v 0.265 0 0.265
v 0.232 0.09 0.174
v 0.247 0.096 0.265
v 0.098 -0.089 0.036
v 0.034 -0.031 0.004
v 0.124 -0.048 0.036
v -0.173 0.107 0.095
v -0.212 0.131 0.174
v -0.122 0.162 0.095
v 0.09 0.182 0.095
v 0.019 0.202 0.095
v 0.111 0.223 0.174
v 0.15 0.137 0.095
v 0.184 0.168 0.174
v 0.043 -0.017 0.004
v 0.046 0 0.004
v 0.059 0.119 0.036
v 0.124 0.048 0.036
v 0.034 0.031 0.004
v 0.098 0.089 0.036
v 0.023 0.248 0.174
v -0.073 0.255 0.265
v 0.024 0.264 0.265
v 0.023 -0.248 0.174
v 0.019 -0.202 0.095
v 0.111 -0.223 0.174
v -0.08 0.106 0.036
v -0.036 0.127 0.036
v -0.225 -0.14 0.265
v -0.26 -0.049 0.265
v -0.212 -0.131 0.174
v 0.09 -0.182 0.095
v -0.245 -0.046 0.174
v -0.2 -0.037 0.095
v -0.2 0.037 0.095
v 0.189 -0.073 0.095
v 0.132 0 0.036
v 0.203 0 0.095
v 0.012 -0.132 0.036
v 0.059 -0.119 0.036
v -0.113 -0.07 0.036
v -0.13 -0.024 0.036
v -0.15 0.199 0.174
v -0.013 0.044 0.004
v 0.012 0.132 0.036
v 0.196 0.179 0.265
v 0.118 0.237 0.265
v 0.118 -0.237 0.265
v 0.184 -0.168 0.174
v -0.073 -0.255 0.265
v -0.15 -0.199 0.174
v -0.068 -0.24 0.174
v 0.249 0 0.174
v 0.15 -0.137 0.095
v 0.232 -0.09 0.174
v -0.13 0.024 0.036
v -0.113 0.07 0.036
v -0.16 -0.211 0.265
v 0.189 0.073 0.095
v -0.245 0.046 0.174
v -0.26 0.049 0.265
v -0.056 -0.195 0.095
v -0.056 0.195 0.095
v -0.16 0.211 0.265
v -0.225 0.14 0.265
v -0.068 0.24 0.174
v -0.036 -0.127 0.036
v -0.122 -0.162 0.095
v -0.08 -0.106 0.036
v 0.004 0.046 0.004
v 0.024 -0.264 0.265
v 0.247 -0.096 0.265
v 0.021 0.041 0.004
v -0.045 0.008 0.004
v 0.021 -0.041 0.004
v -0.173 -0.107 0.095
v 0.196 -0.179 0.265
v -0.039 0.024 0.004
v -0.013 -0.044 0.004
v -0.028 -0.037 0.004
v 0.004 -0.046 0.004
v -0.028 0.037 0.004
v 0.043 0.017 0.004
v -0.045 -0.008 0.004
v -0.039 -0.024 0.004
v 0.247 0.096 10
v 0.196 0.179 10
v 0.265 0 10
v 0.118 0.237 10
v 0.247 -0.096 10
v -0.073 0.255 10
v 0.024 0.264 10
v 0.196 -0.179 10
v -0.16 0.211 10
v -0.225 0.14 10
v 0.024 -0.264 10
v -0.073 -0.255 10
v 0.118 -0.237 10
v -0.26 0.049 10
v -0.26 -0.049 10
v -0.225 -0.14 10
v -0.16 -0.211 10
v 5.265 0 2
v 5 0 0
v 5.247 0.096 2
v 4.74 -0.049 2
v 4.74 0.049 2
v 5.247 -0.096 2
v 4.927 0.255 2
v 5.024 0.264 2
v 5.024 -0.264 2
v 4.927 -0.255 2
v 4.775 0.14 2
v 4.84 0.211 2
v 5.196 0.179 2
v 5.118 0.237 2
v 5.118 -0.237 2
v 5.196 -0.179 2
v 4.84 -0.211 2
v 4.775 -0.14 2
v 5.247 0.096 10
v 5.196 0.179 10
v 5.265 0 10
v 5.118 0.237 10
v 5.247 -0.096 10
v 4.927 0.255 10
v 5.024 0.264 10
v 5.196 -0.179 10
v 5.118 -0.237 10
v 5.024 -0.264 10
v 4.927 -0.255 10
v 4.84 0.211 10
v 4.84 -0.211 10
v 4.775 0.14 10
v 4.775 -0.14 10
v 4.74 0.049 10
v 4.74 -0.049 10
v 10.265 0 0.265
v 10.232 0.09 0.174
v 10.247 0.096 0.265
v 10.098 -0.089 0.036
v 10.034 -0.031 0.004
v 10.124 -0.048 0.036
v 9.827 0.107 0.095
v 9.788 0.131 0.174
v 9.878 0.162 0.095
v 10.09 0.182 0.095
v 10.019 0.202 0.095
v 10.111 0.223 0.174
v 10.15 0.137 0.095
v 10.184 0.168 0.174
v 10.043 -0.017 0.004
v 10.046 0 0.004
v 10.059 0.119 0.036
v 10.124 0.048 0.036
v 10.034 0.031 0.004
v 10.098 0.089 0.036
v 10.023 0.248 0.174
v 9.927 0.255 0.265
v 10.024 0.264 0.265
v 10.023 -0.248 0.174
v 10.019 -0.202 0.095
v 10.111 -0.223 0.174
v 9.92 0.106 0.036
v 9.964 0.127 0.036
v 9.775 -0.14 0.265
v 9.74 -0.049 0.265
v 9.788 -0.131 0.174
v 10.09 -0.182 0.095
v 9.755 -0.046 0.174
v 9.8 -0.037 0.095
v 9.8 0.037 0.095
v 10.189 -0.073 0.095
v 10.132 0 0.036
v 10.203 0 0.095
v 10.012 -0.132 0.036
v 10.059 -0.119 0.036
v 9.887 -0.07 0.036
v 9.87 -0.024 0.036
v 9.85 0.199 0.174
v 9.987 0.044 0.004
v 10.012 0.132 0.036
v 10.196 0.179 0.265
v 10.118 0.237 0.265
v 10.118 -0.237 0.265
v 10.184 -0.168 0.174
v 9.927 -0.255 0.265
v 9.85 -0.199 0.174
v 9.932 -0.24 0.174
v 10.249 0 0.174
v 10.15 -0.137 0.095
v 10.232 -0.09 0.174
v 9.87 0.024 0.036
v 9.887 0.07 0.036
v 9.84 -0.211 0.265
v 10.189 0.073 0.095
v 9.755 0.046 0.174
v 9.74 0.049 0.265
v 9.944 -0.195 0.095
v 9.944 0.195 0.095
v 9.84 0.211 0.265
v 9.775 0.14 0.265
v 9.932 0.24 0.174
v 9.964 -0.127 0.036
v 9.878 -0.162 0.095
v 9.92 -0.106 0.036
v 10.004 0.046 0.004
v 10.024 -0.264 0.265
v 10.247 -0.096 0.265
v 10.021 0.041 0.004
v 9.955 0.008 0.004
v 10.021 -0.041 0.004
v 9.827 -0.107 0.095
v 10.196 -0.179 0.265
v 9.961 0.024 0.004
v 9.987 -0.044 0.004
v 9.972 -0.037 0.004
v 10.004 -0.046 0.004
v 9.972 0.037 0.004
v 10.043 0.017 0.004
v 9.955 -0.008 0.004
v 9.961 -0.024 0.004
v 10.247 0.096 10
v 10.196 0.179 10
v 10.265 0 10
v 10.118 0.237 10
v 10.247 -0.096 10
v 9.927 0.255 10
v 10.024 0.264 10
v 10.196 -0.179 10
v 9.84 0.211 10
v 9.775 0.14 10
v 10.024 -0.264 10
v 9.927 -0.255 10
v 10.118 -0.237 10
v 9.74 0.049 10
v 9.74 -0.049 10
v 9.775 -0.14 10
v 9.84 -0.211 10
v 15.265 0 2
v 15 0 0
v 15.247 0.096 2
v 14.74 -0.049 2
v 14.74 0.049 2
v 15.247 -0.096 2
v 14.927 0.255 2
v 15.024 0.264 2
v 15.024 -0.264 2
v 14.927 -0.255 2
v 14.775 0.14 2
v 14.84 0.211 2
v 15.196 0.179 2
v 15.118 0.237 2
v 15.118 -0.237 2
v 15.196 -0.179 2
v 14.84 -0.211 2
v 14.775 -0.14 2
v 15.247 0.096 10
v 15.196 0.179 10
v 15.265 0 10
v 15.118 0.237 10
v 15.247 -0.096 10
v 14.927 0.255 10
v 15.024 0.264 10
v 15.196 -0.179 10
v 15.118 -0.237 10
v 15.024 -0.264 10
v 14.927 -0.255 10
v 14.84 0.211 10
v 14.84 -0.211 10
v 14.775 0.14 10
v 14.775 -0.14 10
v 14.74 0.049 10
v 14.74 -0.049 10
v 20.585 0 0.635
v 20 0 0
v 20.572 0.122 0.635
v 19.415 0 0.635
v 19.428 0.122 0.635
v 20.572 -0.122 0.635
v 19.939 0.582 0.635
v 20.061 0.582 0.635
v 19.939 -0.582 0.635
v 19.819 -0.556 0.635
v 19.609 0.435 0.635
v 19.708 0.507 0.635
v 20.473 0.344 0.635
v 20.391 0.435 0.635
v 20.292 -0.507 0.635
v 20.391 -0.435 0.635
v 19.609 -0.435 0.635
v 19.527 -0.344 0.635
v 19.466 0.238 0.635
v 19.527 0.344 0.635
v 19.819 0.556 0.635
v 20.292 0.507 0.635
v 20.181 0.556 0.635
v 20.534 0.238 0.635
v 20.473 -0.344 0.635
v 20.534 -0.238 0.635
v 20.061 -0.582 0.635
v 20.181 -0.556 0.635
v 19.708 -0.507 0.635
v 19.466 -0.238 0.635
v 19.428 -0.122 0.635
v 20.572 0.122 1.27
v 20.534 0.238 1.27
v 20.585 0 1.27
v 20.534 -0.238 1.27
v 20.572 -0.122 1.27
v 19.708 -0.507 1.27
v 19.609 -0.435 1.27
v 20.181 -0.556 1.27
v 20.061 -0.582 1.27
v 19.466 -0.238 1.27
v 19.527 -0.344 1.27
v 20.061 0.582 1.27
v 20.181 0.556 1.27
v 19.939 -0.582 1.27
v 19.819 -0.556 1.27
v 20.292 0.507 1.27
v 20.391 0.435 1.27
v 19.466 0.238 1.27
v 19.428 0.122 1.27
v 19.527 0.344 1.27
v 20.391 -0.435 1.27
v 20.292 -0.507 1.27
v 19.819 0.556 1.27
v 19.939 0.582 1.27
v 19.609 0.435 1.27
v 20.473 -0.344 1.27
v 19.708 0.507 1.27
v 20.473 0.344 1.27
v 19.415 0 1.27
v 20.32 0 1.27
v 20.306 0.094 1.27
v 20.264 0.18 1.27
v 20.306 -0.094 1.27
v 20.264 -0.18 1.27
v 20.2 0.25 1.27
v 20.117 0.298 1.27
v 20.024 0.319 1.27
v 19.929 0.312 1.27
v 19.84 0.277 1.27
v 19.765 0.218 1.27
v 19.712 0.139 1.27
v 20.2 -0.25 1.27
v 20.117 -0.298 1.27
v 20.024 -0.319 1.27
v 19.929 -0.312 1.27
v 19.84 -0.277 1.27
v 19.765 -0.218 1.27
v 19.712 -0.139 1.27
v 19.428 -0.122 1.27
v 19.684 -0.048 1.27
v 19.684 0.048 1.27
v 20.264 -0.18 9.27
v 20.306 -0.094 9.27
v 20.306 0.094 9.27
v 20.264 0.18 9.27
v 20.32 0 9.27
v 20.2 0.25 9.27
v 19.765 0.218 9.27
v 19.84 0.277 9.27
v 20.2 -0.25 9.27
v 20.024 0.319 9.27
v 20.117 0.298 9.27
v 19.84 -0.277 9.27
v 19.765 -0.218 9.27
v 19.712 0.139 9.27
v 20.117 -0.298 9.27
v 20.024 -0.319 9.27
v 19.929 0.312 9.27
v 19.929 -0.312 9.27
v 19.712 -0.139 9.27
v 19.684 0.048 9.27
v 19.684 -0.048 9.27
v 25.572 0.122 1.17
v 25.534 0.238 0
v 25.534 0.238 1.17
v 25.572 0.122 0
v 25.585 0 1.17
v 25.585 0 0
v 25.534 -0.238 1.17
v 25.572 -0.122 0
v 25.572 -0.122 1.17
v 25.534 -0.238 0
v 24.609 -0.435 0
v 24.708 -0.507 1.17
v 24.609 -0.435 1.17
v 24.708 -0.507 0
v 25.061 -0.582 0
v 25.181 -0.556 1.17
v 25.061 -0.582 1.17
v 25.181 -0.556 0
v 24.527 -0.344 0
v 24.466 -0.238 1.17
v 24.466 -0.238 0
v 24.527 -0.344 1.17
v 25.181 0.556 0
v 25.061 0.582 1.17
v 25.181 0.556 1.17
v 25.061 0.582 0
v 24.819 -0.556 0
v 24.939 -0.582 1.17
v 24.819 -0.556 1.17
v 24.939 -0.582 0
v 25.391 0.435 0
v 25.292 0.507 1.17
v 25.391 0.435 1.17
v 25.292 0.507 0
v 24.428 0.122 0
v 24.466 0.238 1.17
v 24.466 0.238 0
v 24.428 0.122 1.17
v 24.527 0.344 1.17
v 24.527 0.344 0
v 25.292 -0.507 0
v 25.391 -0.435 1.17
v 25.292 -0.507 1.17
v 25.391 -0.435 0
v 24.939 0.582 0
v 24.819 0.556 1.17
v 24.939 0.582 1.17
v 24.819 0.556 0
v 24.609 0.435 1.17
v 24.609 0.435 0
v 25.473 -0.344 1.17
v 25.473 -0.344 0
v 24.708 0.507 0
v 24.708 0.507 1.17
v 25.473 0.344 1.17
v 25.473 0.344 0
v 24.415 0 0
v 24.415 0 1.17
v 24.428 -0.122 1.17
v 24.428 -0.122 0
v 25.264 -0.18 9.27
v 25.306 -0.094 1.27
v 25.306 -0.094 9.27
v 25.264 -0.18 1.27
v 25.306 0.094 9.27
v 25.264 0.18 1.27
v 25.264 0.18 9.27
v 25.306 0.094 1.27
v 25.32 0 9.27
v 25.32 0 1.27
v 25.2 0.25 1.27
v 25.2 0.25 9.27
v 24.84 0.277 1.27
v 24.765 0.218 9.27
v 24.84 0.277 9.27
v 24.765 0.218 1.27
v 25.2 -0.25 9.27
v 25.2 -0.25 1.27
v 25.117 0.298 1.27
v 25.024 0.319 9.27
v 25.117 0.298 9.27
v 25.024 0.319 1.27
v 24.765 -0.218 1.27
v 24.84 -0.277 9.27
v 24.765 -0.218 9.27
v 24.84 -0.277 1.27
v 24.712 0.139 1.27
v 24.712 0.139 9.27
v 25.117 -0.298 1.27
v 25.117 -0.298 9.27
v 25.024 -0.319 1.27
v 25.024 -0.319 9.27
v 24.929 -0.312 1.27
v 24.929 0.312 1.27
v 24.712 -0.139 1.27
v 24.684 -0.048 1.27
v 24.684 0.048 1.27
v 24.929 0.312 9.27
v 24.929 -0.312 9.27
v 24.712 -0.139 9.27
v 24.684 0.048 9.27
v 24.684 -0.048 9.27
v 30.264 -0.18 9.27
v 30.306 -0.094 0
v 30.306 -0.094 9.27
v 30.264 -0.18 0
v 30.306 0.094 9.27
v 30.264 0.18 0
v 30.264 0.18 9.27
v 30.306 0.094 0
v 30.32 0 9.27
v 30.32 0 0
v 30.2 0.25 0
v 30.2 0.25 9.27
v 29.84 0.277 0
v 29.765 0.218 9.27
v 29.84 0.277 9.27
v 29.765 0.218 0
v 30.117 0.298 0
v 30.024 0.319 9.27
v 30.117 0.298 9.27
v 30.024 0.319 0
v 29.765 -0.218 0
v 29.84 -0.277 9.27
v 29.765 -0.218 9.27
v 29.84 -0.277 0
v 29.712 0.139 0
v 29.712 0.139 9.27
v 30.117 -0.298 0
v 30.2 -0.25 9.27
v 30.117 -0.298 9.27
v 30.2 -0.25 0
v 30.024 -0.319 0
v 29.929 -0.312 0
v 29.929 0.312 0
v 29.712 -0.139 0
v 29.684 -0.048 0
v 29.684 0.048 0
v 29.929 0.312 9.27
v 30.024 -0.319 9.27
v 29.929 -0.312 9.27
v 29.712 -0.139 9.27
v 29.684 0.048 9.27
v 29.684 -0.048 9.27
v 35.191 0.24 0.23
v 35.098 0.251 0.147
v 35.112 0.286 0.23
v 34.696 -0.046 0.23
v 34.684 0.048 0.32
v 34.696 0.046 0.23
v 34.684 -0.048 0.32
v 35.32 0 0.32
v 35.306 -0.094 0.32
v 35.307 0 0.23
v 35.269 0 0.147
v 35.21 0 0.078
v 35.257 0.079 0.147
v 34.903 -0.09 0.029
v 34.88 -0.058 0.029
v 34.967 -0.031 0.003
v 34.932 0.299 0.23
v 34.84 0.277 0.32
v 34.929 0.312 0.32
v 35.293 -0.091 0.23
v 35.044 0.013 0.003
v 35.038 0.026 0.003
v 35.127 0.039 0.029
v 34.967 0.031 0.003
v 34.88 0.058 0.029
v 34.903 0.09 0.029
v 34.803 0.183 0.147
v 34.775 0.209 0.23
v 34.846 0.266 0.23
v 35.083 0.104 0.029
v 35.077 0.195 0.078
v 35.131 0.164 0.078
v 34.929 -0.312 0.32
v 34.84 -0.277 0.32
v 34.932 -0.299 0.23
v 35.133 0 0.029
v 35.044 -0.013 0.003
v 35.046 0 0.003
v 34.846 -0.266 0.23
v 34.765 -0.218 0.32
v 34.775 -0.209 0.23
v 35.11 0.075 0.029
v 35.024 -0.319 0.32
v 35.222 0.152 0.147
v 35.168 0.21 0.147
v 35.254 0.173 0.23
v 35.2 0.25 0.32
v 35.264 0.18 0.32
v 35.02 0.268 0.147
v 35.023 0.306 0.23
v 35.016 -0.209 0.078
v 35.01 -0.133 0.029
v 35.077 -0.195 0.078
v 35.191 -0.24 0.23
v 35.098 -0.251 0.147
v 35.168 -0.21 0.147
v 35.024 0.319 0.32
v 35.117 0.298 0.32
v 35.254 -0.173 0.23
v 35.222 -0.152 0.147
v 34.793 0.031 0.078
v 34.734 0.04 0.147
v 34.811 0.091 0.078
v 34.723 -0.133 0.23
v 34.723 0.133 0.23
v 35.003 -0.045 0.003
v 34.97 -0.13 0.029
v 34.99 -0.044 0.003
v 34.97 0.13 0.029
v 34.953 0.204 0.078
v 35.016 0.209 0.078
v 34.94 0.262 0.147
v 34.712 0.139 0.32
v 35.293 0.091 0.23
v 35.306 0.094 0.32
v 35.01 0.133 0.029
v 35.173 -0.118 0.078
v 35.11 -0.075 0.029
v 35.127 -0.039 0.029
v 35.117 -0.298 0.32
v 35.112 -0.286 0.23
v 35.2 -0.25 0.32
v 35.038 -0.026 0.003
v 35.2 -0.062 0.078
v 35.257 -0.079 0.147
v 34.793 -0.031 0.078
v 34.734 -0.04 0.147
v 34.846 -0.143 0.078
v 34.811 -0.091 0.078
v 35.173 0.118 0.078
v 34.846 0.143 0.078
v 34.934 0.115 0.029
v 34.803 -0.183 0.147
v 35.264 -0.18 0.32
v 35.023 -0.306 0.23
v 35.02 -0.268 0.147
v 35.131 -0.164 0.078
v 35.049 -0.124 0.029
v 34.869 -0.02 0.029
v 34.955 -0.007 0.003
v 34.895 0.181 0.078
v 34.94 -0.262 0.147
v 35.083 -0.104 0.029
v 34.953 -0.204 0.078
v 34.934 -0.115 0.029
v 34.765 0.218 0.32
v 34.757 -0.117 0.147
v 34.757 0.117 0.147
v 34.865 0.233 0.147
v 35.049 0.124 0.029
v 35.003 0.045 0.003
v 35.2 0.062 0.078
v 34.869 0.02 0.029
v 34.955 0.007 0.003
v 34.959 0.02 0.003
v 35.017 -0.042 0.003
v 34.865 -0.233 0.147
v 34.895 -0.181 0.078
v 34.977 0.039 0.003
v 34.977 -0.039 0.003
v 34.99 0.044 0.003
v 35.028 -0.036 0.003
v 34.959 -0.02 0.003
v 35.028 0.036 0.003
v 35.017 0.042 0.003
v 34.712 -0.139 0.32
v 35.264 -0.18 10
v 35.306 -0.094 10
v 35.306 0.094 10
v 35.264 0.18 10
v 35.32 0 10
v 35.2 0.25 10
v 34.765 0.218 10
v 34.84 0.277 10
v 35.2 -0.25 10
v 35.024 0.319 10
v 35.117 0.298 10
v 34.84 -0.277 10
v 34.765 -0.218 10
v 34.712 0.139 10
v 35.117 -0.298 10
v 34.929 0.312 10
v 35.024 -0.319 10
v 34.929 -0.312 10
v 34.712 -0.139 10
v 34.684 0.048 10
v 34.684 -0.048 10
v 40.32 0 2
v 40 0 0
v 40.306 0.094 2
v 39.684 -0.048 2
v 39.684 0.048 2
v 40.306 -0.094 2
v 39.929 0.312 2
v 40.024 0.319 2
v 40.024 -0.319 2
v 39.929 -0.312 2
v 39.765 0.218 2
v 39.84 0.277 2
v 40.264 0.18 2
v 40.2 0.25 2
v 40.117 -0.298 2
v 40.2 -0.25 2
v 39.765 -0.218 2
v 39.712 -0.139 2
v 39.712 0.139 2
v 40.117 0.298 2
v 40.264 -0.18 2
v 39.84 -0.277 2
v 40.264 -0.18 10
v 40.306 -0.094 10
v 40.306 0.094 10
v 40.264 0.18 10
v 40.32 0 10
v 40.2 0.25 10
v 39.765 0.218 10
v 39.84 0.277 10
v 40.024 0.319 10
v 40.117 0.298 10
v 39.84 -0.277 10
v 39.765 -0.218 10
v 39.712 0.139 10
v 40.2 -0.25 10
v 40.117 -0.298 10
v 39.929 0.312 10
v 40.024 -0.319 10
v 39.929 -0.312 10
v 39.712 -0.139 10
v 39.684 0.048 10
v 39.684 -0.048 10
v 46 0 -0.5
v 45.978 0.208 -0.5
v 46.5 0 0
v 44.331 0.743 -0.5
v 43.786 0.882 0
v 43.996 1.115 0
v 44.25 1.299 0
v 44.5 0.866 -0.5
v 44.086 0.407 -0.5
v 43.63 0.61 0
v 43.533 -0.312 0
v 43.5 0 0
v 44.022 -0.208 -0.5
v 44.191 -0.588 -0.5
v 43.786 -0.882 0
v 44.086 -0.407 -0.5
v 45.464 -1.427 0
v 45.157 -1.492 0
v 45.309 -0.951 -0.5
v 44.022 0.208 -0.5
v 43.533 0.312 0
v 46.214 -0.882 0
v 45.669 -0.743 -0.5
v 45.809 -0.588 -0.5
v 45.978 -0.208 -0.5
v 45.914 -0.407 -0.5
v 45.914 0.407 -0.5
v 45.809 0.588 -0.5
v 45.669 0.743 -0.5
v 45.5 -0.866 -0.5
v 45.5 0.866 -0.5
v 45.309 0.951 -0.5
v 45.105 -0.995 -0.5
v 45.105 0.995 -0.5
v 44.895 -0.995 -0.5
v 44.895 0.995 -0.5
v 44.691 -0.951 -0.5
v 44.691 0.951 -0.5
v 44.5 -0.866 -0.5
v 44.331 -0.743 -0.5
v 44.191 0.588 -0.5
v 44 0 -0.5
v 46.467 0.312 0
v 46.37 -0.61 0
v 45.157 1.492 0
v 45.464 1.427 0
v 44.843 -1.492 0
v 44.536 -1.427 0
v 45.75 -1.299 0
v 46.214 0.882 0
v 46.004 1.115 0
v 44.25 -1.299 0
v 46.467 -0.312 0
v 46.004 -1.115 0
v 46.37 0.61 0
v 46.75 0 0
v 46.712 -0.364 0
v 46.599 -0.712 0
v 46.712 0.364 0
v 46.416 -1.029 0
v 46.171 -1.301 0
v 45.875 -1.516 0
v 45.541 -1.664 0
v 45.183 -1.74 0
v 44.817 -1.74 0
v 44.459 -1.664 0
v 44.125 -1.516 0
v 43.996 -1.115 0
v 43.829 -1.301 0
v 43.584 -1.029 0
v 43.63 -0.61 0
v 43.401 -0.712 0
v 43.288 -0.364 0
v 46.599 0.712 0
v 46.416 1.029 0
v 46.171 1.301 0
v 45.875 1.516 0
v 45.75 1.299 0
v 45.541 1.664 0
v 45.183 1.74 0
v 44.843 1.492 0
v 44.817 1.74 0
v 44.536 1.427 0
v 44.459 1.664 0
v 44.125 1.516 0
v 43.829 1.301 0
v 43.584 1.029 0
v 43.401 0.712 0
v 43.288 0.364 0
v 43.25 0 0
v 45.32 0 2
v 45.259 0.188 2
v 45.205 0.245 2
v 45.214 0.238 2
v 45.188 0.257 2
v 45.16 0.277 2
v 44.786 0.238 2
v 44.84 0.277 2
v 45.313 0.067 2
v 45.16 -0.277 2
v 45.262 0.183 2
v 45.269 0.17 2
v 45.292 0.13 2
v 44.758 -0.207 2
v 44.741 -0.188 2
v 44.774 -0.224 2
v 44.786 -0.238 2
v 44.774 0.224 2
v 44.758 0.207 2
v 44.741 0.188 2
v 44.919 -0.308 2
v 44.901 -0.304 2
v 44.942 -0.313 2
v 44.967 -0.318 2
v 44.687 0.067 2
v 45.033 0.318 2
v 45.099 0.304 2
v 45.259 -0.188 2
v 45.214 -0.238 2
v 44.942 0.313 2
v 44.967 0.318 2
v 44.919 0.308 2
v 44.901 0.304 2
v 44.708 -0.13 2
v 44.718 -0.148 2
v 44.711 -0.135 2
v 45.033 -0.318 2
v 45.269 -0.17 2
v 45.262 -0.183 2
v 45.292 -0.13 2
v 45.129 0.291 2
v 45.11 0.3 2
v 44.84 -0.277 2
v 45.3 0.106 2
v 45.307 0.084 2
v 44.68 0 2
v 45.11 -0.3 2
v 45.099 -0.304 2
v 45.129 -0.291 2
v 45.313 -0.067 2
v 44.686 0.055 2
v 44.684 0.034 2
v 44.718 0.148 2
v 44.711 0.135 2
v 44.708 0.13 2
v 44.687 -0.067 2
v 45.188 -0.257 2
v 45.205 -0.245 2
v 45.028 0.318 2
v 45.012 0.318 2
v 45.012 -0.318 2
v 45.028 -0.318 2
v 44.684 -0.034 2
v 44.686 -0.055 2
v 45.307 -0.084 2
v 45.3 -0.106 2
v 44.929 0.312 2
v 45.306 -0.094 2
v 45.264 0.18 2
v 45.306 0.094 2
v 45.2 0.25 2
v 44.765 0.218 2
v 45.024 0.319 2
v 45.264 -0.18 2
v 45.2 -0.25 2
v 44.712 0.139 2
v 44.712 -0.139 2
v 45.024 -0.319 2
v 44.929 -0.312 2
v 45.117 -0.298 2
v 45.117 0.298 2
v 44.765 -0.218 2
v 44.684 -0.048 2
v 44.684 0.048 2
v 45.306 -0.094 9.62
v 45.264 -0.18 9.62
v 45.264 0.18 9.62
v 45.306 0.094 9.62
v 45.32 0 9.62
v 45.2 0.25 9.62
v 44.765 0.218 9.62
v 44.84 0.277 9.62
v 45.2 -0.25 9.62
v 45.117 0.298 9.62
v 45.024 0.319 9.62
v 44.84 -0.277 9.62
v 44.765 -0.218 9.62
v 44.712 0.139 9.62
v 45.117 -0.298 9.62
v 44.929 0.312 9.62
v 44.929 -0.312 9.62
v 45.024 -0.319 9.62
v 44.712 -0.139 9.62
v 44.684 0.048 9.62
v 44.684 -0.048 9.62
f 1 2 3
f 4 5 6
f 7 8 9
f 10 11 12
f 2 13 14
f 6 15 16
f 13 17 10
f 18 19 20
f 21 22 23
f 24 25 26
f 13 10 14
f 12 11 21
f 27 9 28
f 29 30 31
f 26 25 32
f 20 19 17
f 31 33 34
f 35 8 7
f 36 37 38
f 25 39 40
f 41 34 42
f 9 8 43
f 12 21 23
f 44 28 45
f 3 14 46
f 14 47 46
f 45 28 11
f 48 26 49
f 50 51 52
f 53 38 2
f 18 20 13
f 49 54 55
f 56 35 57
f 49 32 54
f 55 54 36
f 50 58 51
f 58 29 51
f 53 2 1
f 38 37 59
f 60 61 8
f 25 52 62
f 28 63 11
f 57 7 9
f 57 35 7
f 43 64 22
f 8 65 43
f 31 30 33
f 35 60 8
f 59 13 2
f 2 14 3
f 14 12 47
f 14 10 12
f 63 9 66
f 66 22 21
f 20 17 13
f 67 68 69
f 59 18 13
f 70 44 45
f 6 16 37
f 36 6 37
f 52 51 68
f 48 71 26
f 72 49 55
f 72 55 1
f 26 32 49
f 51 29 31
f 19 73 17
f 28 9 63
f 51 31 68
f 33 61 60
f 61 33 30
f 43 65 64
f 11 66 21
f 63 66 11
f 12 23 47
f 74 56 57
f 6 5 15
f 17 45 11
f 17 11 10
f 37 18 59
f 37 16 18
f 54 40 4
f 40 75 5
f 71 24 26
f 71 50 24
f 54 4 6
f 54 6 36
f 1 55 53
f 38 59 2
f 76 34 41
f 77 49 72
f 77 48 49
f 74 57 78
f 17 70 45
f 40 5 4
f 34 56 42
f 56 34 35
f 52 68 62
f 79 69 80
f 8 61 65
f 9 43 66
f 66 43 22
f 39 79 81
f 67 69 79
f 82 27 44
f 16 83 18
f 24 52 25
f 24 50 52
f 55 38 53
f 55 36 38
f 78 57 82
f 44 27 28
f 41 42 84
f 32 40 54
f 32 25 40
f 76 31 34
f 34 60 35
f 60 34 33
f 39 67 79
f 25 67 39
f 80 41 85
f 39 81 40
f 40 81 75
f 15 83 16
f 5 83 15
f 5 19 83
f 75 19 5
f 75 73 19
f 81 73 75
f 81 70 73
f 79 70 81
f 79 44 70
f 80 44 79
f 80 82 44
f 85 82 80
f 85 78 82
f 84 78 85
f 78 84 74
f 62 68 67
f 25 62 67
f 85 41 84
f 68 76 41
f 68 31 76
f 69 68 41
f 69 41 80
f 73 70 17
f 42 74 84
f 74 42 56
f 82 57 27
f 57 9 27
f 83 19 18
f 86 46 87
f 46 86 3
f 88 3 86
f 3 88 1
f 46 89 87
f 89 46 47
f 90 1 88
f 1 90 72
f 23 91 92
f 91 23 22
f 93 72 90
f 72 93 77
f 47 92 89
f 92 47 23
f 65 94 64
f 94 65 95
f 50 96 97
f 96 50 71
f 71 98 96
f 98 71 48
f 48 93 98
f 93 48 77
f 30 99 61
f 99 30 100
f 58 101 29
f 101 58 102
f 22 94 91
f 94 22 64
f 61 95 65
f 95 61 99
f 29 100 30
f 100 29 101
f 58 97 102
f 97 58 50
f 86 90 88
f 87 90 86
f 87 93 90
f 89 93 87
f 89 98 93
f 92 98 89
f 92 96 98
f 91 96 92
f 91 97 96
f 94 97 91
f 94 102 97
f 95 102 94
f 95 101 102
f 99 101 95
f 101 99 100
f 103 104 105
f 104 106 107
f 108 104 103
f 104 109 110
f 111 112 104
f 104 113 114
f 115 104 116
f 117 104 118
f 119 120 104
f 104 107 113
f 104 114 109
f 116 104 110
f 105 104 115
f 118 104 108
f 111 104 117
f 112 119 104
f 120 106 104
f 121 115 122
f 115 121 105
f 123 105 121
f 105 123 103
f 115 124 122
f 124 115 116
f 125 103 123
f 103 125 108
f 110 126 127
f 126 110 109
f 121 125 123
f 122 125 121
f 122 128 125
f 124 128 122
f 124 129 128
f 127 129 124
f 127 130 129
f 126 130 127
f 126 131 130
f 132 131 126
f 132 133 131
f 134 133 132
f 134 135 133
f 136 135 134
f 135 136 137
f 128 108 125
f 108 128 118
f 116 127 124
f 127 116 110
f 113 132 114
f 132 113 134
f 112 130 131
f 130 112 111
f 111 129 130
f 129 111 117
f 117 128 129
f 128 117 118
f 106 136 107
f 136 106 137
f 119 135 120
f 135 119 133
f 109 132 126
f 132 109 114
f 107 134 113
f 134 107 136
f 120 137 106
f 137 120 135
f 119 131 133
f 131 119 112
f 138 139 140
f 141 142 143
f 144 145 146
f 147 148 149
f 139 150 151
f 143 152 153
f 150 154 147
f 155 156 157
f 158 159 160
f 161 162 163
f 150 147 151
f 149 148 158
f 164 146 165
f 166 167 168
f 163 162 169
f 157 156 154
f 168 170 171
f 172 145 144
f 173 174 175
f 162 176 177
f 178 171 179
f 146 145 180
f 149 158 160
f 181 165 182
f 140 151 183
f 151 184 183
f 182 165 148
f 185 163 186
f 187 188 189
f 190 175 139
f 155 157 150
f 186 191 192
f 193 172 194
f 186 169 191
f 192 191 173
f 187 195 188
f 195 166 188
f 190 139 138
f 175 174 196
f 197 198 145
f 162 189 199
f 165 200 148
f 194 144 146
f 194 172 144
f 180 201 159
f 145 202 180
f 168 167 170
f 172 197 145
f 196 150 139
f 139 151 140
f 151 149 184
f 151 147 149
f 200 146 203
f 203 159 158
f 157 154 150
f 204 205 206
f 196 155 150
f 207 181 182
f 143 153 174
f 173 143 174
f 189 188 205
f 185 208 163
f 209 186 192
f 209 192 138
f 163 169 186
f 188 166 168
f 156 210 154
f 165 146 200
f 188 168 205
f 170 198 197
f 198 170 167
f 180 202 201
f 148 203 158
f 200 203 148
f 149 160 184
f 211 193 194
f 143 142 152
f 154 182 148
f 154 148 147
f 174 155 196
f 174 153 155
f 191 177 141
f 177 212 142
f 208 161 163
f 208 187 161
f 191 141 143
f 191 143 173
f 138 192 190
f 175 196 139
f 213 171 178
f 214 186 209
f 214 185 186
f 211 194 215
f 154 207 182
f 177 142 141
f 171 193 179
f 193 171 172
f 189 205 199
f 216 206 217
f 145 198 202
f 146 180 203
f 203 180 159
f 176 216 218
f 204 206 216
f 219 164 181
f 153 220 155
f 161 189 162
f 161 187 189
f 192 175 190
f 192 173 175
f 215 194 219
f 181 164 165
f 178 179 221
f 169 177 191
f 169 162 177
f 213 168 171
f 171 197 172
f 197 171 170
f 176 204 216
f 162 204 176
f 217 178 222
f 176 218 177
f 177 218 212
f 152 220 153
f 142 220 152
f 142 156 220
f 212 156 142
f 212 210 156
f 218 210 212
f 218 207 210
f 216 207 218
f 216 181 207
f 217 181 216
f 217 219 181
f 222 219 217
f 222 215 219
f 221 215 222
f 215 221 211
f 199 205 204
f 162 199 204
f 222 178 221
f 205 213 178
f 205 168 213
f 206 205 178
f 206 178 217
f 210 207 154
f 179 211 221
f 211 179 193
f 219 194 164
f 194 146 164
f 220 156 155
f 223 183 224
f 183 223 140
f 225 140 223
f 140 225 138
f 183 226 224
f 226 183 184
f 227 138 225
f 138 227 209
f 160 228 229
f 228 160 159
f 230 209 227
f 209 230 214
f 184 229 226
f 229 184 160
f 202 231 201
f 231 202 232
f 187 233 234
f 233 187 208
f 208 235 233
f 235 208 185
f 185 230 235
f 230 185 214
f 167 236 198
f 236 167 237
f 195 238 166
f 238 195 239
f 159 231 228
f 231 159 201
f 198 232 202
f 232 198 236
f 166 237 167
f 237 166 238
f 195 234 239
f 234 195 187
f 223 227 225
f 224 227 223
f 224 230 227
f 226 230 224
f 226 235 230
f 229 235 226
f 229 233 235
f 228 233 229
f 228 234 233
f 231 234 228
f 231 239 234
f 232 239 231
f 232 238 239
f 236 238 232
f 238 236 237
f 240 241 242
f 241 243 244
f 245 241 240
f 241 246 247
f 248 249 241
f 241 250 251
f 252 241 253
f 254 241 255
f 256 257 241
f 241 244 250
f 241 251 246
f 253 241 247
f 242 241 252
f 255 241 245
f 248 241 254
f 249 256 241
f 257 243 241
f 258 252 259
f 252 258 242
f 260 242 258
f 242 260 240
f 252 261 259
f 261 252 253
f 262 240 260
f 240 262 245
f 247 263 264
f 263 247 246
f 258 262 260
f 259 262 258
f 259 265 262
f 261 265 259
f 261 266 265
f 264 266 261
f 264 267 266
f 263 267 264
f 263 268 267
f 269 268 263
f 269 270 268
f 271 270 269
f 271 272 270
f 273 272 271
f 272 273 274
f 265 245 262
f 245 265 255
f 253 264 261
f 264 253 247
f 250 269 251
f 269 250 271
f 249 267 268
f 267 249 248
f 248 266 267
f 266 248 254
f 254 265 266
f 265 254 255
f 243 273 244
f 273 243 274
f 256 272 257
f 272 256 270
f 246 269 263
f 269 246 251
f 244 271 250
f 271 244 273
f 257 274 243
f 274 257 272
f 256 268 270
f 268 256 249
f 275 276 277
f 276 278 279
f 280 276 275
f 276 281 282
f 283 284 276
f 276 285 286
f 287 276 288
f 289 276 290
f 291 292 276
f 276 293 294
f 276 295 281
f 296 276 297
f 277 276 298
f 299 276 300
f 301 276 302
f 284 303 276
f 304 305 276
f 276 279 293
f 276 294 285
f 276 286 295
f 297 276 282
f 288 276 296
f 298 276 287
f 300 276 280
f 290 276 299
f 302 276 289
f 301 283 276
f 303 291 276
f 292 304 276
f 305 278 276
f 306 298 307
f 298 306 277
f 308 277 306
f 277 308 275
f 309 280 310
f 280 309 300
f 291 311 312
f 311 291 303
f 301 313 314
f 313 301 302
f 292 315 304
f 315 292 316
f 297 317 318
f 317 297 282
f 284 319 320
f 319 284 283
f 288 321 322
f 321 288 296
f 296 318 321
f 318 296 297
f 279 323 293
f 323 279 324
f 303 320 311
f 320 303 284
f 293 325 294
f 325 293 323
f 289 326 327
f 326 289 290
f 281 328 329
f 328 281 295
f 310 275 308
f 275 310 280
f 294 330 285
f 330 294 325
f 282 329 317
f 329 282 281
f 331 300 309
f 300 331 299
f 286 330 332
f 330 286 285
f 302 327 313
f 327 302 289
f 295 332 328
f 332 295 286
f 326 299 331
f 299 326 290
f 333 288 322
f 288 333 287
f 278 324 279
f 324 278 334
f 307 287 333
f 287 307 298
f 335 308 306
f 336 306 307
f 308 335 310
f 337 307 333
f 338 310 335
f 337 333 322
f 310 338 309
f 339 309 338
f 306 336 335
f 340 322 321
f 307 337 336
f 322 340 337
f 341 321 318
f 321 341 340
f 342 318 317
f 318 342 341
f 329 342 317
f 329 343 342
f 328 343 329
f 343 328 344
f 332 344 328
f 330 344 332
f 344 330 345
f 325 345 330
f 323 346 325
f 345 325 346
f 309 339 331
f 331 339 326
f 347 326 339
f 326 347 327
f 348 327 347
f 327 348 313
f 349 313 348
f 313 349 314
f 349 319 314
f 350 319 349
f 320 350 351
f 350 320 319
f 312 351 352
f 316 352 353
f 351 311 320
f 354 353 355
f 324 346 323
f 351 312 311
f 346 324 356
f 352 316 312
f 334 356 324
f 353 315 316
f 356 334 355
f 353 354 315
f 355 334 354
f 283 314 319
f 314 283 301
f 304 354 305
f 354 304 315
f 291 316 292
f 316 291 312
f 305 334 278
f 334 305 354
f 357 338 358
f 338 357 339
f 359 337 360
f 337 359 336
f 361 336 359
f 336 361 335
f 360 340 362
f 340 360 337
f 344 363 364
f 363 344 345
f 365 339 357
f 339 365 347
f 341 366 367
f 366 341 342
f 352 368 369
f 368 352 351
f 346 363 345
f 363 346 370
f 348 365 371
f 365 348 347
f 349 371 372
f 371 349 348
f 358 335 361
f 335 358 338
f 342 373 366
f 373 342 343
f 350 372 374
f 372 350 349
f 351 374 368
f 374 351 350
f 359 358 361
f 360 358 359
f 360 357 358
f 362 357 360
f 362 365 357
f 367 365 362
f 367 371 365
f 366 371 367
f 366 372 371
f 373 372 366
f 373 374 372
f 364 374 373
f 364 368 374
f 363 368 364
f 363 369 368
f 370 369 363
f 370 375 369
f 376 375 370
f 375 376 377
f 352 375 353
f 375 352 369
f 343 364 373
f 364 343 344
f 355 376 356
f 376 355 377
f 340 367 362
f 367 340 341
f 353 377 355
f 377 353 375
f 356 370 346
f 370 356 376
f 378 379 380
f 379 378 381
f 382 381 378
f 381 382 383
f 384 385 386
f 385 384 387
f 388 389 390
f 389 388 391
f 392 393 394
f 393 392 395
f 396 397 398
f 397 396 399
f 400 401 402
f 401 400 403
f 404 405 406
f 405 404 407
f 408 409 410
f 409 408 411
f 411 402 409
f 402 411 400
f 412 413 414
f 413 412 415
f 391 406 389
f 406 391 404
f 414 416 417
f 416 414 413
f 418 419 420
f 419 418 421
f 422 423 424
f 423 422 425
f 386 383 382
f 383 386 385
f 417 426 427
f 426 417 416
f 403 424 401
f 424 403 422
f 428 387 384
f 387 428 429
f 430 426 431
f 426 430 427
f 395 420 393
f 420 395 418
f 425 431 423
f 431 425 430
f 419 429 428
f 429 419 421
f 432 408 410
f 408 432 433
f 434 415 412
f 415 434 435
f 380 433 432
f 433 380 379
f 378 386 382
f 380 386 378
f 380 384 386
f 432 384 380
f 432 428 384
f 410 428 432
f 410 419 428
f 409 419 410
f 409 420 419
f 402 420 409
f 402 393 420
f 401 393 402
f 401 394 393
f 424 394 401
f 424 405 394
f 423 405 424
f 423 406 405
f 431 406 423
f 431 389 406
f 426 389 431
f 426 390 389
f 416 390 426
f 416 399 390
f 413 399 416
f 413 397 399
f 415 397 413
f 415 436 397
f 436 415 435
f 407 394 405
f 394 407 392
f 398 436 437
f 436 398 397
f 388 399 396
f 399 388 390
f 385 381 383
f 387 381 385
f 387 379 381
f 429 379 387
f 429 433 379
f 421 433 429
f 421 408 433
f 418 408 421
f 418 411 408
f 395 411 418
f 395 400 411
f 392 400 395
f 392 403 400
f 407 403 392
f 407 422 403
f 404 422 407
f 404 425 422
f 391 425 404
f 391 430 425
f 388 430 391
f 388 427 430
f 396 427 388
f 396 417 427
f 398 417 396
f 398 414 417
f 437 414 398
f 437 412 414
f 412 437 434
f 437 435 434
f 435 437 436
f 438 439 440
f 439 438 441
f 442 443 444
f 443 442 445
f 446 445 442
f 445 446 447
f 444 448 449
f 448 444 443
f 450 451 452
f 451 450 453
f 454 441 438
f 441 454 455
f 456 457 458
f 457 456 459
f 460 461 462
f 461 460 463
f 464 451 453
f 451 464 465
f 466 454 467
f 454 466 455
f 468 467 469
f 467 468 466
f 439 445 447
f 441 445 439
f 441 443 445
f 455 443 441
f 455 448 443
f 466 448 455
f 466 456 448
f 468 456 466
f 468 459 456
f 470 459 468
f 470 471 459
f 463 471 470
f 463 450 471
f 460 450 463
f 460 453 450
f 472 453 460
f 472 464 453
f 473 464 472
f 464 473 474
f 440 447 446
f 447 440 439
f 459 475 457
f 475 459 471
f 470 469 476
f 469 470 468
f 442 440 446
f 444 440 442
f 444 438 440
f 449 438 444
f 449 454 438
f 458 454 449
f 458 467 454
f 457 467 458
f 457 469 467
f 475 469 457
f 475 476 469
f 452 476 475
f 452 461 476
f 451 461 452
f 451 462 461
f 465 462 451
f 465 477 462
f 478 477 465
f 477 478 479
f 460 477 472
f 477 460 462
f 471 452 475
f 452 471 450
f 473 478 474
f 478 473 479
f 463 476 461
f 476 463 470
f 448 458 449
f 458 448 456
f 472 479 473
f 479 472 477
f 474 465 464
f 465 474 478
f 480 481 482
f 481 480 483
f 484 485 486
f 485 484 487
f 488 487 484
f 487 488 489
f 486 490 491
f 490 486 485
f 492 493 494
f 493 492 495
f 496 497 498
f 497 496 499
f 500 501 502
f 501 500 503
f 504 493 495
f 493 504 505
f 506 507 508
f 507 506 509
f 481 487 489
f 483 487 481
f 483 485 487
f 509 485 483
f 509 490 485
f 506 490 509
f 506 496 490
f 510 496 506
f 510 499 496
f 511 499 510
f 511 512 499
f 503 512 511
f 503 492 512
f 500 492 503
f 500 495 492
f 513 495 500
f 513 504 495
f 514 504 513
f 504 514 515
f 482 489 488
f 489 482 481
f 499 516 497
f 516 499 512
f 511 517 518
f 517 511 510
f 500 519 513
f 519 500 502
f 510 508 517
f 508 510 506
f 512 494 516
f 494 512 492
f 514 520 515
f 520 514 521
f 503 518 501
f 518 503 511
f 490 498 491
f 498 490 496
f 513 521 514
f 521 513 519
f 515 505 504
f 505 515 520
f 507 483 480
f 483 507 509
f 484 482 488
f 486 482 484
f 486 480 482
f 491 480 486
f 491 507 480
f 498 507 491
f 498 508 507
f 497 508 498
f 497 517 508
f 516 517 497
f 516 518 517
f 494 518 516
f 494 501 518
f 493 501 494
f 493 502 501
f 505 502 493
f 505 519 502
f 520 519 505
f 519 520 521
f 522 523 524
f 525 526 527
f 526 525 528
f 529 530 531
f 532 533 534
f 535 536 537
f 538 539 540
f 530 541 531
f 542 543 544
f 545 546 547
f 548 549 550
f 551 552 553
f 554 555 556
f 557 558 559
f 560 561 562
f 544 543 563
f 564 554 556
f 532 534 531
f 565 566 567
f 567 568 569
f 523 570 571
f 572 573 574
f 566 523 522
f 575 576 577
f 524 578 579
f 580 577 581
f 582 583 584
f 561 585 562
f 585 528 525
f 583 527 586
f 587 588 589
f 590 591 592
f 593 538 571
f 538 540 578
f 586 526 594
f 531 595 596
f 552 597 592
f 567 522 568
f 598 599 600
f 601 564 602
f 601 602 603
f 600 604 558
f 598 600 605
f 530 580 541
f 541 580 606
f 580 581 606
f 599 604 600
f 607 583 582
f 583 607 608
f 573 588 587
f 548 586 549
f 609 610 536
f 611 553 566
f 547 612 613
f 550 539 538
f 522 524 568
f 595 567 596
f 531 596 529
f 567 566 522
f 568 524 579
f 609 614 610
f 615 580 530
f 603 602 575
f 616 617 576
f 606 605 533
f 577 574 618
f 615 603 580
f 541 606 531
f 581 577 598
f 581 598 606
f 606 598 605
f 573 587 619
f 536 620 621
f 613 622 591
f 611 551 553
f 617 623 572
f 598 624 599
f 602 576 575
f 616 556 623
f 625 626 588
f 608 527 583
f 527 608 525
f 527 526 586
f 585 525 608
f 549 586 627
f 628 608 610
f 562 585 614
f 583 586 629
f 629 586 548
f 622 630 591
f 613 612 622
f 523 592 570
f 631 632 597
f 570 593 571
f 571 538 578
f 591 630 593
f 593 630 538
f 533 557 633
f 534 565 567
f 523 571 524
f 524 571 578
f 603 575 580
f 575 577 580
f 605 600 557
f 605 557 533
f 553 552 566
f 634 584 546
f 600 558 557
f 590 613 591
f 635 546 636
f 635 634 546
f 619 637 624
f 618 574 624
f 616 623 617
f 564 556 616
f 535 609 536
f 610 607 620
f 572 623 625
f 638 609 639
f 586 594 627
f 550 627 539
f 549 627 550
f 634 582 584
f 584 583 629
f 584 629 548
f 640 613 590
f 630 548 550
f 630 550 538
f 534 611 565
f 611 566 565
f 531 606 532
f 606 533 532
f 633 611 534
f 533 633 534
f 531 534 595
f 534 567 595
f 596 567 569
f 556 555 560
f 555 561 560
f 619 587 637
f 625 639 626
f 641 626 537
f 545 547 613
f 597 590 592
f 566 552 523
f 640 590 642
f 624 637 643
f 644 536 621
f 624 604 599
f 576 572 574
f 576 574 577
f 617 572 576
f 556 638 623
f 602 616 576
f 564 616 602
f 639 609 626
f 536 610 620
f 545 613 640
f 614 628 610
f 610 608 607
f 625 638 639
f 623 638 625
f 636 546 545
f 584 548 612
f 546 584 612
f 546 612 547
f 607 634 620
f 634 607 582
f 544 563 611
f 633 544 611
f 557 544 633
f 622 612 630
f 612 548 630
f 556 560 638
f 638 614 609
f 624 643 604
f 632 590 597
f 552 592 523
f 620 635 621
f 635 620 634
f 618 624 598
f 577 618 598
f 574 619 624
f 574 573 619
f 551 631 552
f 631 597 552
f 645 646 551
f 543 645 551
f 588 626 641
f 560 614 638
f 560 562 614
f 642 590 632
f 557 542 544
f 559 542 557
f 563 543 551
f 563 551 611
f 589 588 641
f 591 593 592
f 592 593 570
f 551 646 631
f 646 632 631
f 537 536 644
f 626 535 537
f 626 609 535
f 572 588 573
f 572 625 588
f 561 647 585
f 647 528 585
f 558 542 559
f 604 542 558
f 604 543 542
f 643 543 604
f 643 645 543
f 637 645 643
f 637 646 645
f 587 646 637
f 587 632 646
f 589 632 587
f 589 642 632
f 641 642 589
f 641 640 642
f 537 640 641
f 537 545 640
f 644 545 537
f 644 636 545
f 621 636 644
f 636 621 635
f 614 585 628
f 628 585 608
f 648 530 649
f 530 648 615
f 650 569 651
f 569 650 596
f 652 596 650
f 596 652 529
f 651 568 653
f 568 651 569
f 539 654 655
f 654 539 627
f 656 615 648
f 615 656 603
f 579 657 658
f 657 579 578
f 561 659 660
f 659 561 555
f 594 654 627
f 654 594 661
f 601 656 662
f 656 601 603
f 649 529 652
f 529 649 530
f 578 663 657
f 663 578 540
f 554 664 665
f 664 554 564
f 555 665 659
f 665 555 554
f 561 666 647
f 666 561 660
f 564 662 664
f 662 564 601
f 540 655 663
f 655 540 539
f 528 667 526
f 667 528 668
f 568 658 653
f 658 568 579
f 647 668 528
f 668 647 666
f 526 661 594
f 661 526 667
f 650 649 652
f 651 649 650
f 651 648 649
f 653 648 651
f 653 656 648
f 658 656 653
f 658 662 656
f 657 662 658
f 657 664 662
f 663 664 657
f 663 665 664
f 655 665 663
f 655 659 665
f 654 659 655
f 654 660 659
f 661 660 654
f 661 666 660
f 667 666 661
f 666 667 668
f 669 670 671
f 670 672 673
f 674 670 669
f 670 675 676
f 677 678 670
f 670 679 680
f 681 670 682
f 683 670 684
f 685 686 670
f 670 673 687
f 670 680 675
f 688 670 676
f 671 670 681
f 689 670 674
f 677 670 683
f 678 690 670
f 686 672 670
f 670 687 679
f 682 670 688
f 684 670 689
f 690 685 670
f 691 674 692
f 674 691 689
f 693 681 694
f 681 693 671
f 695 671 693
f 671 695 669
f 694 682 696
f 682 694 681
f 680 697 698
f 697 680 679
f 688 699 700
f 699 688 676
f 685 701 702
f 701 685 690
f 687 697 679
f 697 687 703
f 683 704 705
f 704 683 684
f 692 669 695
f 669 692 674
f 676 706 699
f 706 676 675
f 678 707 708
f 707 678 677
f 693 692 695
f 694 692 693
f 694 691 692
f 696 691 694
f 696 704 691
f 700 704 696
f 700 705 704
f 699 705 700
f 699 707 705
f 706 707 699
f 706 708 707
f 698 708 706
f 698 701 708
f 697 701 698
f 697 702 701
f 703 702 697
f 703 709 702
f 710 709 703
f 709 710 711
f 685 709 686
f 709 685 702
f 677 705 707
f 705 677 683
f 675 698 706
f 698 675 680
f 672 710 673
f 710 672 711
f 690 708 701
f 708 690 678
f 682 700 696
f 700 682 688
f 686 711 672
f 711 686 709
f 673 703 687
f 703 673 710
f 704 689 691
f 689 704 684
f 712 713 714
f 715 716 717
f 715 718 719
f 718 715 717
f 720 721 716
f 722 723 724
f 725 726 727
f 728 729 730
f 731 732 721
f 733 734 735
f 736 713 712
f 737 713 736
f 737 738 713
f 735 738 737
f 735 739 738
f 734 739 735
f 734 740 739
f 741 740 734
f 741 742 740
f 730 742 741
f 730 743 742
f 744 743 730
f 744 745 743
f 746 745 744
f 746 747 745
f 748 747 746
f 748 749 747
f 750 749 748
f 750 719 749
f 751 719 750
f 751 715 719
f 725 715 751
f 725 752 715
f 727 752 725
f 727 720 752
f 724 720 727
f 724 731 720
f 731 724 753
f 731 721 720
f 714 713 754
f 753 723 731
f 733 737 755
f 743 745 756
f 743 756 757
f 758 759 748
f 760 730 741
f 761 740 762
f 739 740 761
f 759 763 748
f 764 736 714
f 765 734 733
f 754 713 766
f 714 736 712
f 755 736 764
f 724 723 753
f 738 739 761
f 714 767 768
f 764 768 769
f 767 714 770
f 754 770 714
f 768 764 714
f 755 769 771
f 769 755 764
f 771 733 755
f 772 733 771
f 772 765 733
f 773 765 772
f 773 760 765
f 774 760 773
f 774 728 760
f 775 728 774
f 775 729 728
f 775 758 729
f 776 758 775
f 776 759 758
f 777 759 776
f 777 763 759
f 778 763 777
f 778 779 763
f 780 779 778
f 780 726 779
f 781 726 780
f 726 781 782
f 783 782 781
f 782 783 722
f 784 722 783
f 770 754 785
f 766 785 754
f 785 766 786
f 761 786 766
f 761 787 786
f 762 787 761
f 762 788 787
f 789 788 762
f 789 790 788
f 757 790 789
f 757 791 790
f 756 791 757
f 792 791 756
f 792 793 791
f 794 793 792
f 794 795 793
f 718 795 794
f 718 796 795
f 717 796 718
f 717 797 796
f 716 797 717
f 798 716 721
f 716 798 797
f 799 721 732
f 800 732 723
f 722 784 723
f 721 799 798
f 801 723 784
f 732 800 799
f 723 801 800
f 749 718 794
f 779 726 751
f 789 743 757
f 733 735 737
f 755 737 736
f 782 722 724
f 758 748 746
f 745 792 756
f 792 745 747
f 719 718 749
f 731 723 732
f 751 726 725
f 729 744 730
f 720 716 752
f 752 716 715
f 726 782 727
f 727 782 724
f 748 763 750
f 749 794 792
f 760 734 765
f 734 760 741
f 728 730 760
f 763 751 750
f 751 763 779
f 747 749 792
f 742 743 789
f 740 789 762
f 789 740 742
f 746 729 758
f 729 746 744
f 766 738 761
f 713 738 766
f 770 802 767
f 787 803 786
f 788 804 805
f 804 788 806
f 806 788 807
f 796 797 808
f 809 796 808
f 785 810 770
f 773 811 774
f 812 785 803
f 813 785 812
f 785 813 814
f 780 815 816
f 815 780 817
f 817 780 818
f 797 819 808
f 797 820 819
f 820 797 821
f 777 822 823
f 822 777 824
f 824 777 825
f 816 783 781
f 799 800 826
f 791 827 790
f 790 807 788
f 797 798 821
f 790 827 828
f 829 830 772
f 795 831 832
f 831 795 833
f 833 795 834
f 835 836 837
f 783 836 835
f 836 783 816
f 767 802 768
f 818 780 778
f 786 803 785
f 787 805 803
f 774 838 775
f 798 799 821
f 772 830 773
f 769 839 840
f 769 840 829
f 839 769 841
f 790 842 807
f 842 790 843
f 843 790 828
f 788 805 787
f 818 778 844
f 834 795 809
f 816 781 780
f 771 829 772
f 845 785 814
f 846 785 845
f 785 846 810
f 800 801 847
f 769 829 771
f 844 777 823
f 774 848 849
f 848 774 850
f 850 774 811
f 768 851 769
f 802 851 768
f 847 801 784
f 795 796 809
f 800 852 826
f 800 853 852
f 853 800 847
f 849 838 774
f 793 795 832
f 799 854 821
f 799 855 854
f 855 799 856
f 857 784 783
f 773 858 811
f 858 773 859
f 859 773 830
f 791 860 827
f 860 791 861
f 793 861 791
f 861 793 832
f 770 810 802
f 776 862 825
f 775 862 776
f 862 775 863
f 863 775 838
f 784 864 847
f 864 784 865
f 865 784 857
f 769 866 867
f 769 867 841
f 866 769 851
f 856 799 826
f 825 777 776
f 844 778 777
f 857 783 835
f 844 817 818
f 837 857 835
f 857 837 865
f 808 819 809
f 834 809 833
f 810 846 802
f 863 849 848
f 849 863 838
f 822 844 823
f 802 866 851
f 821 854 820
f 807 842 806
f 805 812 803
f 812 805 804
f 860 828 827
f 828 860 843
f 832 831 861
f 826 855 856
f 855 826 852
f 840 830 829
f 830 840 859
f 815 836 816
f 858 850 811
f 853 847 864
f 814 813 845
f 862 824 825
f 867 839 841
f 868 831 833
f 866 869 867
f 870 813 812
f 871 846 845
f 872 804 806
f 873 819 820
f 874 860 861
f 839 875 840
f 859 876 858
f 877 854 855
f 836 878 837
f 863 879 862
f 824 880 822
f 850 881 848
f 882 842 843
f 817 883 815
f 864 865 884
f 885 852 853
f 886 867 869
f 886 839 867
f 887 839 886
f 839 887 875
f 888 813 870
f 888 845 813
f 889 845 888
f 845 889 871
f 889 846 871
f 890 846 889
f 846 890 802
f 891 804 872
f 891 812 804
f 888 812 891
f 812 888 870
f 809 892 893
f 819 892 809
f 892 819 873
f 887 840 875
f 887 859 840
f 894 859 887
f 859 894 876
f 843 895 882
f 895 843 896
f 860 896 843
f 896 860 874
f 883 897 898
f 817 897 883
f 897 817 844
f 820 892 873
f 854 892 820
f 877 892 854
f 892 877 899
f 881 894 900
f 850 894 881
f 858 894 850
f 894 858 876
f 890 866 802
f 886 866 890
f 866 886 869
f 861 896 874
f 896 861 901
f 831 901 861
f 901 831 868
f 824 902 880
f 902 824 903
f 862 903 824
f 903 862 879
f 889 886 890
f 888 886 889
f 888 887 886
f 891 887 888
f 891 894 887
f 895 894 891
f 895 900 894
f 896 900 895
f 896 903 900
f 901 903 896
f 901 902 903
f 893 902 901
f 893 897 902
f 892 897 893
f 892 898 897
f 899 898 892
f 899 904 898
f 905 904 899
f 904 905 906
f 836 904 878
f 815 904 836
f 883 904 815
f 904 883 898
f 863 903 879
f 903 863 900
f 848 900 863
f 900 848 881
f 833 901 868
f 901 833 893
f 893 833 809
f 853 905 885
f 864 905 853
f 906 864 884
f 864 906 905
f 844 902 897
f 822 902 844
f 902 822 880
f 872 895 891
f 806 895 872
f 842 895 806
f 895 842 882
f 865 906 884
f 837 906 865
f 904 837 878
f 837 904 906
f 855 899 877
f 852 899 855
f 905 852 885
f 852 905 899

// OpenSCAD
// file: test_probes/default_probe.scad
module default_probe() {
   //tip part 1
   color("Blue")
   translate([0,0,-0.5])cylinder(h=0.5,d1=2,d2=3,center=false);
   //tip part 2
   color("Red")
   translate([0,0,0])cylinder(h=2,d1=3.5,d2=0.64,center=false);
   //shaft 
   color("Red")
   translate([0,0,2])cylinder(h=7.62,d=0.64,center=false);
}
// file: test_probes/075_PRP259RS_S.scad
module 075_PRP259RS_S() {
   color("Gold")
   //tip part 1
   //tip part 2
   translate([0,0,0])cylinder(h=2,d1=0,d2=0.64,center=false);
   //shaft 
   color("Gold")
   translate([0,0,2])cylinder(h=8,d=0.64,center=false);
}
// file: test_probes/075_PRP2540S.scad
module 075_PRP2540S() {
   color("Gold")
   //tip part 1
   translate([0,0,0.64/2])sphere(d=0.64);
   //tip part 2
   color("Gold")
   translate([0,0,0.64/2])cylinder(h=2,d=0.64,center=false);
   //shaft 
   color("Gold")
   translate([0,0,2])cylinder(h=8,d=0.64,center=false);
}
// file: test_probes/075_PRP2520S.scad
module 075_PRP2520S() {
   color("Gold")
   //tip part 1
   translate([0,0,0])cylinder(h=2,d=0.64,center=false);
   //tip part 2
   //shaft 
   color("Gold")
   translate([0,0,1.27])cylinder(h=8,d=0.64,center=false);
}
// file: test_probes/075_PRP2510S.scad
module 075_PRP2510S() {
   color("Gold")
   //tip part 1
   translate([0,0,0])cylinder(h=1.17,d=1.17,center=false);
   //tip part 2
   //shaft 
   color("Gold")
   translate([0,0,1.27])cylinder(h=8,d=0.64,center=false);
}
// file: test_probes/075_PRP2501S.scad
module 075_PRP2501S() {
   color("Gold")
   //tip part 1
   translate([0,0,0])cylinder(h=1.27/2,d1=0,d2=1.17,center=false);
   //tip part 2
   color("Gold")
   translate([0,0,1.27/2])cylinder(h=1.27/2,d=1.17,center=false);
   //shaft 
   color("Gold")
   translate([0,0,1.27])cylinder(h=8,d=0.64,center=false);
}
// file: test_probes/050_PRP2541S.scad
module 050_PRP2541S() {
   color("Gold")
   //tip part 1
   translate([0,0,0])cylinder(h=2,d1=0,d2=0.53,center=false);
   //tip part 2
   //shaft 
   color("Gold")
   translate([0,0,2])cylinder(h=8,d=0.53,center=false);
}
// file: test_probes/050_PRP2540S.scad
module 050_PRP2540S() {
   color("Gold")
   //tip part 1
   translate([0,0,0.53/2])sphere(d=0.53);
   color("Gold")
   //tip part 2
   translate([0,0,0.53/2])cylinder(h=2,d=0.53,center=false);
   //shaft 
   color("Gold")
   translate([0,0,2])cylinder(h=8,d=0.53,center=false);
}
// file: test_probes/050_PTP2541S.scad
module 050_PTP2541S() {
   color("Gold")
   //tip part 1
   translate([0,0,0])cylinder(h=2,d1=0,d2=0.53,center=false);
   //tip part 2
   //shaft 
   color("Gold")
   translate([0,0,2])cylinder(h=8,d=0.53,center=false);
}
// file: test_probes/050_PTP2540S.scad
module 050_PTP2540S() {
   color("Gold")
   //tip part 1
   translate([0,0,0.53/2])sphere(d=0.53);
   //tip part 2
   color("Gold")
    translate([0,0,0.53/2])cylinder(h=2,d=0.53,center=false);
   //shaft 
   color("Gold")
   translate([0,0,2])cylinder(h=8,d=0.53,center=false);
}
// main file
/*  This program is free software: you can redistribute it and/or modify
    it under the terms of the GNU General Public License as published by
    the Free Software Foundation, either version 3 of the License, or
    (at your option) any later version.

    This program is distributed in the hope that it will be useful,
    but WITHOUT ANY WARRANTY; without even the implied warranty of
    MERCHANTABILITY or FITNESS FOR A PARTICULAR PURPOSE.  See the
    GNU General Public License for more details.

    You should have received a copy of the GNU General Public License
    along with this program. If not, see <https://www.gnu.org/licenses/>.   
*/
use <test_probes/050_PTP2540S.scad>;
use <test_probes/050_PTP2541S.scad>;
use <test_probes/050_PRP2540S.scad>;
use <test_probes/050_PRP2541S.scad>;
use <test_probes/050_PRP2540S.scad>;
use <test_probes/050_PRP2541S.scad>;
use <test_probes/075_PRP2501S.scad>;
use <test_probes/075_PRP2510S.scad>;
use <test_probes/075_PRP2520S.scad>;
use <test_probes/075_PRP2540S.scad>;
use <test_probes/075_PRP259RS_S.scad>;
use <test_probes/default_probe.scad>;

/*
    Connect a probe name with its defining module.
    This somewhat breaks the open-closed principle.
    There are no function pointers, this could be
    generated with a script to keep the code clean.
*/
module probe(probe="",inset=0,movementdistance=0){
   //Probe QATech.com 075-PRP259RS-S
   $fs=0.1;
   delay=inset/movementdistance;
   translate([0,0,$t>delay?($t-delay)*movementdistance:0]){
       if(probe=="050-PTP2540S"){
           050_PTP2540S();
       } else if(probe=="050-PTP2541S"){
           050_PTP2541S();
       }else if(probe=="050-PRP2540S"){
           050_PRP2540S();
       }else if(probe=="050-PRP2541S"){
           050_PRP2541S();
       }else if(probe=="075-PRP2501S"){
           075_PRP2501S();
       }else if(probe=="075-PRP2510S"){
           075_PRP2510S();
       }else if(probe=="075-PRP2520S"){
           075_PRP2520S();
       }else if(probe=="075-PRP2540S"){
           075_PRP2540S();
       }else if(probe=="075-PRP259RS-S"){
           075_PRP259RS_S();
       }else {
            default_probe();
       }
   }
}

function get_probes() = [
        "050-PTP2540S","050-PTP2541S","050-PRP2540S","050-PRP2541S","075-PRP2501S","075-PRP2510S","075-PRP2520S","075-PRP2540S","075-PRP259RS-S", "def"
    ];

probes=get_probes();
space = 0;
for(i=[0:len(probes)-1]){
    let(space = i*5, p=probes[i]) {
    translate([space, 0, 0])probe(probe=p, inset=0,movementdistance=0);
    echo(p, space);
    }
};
